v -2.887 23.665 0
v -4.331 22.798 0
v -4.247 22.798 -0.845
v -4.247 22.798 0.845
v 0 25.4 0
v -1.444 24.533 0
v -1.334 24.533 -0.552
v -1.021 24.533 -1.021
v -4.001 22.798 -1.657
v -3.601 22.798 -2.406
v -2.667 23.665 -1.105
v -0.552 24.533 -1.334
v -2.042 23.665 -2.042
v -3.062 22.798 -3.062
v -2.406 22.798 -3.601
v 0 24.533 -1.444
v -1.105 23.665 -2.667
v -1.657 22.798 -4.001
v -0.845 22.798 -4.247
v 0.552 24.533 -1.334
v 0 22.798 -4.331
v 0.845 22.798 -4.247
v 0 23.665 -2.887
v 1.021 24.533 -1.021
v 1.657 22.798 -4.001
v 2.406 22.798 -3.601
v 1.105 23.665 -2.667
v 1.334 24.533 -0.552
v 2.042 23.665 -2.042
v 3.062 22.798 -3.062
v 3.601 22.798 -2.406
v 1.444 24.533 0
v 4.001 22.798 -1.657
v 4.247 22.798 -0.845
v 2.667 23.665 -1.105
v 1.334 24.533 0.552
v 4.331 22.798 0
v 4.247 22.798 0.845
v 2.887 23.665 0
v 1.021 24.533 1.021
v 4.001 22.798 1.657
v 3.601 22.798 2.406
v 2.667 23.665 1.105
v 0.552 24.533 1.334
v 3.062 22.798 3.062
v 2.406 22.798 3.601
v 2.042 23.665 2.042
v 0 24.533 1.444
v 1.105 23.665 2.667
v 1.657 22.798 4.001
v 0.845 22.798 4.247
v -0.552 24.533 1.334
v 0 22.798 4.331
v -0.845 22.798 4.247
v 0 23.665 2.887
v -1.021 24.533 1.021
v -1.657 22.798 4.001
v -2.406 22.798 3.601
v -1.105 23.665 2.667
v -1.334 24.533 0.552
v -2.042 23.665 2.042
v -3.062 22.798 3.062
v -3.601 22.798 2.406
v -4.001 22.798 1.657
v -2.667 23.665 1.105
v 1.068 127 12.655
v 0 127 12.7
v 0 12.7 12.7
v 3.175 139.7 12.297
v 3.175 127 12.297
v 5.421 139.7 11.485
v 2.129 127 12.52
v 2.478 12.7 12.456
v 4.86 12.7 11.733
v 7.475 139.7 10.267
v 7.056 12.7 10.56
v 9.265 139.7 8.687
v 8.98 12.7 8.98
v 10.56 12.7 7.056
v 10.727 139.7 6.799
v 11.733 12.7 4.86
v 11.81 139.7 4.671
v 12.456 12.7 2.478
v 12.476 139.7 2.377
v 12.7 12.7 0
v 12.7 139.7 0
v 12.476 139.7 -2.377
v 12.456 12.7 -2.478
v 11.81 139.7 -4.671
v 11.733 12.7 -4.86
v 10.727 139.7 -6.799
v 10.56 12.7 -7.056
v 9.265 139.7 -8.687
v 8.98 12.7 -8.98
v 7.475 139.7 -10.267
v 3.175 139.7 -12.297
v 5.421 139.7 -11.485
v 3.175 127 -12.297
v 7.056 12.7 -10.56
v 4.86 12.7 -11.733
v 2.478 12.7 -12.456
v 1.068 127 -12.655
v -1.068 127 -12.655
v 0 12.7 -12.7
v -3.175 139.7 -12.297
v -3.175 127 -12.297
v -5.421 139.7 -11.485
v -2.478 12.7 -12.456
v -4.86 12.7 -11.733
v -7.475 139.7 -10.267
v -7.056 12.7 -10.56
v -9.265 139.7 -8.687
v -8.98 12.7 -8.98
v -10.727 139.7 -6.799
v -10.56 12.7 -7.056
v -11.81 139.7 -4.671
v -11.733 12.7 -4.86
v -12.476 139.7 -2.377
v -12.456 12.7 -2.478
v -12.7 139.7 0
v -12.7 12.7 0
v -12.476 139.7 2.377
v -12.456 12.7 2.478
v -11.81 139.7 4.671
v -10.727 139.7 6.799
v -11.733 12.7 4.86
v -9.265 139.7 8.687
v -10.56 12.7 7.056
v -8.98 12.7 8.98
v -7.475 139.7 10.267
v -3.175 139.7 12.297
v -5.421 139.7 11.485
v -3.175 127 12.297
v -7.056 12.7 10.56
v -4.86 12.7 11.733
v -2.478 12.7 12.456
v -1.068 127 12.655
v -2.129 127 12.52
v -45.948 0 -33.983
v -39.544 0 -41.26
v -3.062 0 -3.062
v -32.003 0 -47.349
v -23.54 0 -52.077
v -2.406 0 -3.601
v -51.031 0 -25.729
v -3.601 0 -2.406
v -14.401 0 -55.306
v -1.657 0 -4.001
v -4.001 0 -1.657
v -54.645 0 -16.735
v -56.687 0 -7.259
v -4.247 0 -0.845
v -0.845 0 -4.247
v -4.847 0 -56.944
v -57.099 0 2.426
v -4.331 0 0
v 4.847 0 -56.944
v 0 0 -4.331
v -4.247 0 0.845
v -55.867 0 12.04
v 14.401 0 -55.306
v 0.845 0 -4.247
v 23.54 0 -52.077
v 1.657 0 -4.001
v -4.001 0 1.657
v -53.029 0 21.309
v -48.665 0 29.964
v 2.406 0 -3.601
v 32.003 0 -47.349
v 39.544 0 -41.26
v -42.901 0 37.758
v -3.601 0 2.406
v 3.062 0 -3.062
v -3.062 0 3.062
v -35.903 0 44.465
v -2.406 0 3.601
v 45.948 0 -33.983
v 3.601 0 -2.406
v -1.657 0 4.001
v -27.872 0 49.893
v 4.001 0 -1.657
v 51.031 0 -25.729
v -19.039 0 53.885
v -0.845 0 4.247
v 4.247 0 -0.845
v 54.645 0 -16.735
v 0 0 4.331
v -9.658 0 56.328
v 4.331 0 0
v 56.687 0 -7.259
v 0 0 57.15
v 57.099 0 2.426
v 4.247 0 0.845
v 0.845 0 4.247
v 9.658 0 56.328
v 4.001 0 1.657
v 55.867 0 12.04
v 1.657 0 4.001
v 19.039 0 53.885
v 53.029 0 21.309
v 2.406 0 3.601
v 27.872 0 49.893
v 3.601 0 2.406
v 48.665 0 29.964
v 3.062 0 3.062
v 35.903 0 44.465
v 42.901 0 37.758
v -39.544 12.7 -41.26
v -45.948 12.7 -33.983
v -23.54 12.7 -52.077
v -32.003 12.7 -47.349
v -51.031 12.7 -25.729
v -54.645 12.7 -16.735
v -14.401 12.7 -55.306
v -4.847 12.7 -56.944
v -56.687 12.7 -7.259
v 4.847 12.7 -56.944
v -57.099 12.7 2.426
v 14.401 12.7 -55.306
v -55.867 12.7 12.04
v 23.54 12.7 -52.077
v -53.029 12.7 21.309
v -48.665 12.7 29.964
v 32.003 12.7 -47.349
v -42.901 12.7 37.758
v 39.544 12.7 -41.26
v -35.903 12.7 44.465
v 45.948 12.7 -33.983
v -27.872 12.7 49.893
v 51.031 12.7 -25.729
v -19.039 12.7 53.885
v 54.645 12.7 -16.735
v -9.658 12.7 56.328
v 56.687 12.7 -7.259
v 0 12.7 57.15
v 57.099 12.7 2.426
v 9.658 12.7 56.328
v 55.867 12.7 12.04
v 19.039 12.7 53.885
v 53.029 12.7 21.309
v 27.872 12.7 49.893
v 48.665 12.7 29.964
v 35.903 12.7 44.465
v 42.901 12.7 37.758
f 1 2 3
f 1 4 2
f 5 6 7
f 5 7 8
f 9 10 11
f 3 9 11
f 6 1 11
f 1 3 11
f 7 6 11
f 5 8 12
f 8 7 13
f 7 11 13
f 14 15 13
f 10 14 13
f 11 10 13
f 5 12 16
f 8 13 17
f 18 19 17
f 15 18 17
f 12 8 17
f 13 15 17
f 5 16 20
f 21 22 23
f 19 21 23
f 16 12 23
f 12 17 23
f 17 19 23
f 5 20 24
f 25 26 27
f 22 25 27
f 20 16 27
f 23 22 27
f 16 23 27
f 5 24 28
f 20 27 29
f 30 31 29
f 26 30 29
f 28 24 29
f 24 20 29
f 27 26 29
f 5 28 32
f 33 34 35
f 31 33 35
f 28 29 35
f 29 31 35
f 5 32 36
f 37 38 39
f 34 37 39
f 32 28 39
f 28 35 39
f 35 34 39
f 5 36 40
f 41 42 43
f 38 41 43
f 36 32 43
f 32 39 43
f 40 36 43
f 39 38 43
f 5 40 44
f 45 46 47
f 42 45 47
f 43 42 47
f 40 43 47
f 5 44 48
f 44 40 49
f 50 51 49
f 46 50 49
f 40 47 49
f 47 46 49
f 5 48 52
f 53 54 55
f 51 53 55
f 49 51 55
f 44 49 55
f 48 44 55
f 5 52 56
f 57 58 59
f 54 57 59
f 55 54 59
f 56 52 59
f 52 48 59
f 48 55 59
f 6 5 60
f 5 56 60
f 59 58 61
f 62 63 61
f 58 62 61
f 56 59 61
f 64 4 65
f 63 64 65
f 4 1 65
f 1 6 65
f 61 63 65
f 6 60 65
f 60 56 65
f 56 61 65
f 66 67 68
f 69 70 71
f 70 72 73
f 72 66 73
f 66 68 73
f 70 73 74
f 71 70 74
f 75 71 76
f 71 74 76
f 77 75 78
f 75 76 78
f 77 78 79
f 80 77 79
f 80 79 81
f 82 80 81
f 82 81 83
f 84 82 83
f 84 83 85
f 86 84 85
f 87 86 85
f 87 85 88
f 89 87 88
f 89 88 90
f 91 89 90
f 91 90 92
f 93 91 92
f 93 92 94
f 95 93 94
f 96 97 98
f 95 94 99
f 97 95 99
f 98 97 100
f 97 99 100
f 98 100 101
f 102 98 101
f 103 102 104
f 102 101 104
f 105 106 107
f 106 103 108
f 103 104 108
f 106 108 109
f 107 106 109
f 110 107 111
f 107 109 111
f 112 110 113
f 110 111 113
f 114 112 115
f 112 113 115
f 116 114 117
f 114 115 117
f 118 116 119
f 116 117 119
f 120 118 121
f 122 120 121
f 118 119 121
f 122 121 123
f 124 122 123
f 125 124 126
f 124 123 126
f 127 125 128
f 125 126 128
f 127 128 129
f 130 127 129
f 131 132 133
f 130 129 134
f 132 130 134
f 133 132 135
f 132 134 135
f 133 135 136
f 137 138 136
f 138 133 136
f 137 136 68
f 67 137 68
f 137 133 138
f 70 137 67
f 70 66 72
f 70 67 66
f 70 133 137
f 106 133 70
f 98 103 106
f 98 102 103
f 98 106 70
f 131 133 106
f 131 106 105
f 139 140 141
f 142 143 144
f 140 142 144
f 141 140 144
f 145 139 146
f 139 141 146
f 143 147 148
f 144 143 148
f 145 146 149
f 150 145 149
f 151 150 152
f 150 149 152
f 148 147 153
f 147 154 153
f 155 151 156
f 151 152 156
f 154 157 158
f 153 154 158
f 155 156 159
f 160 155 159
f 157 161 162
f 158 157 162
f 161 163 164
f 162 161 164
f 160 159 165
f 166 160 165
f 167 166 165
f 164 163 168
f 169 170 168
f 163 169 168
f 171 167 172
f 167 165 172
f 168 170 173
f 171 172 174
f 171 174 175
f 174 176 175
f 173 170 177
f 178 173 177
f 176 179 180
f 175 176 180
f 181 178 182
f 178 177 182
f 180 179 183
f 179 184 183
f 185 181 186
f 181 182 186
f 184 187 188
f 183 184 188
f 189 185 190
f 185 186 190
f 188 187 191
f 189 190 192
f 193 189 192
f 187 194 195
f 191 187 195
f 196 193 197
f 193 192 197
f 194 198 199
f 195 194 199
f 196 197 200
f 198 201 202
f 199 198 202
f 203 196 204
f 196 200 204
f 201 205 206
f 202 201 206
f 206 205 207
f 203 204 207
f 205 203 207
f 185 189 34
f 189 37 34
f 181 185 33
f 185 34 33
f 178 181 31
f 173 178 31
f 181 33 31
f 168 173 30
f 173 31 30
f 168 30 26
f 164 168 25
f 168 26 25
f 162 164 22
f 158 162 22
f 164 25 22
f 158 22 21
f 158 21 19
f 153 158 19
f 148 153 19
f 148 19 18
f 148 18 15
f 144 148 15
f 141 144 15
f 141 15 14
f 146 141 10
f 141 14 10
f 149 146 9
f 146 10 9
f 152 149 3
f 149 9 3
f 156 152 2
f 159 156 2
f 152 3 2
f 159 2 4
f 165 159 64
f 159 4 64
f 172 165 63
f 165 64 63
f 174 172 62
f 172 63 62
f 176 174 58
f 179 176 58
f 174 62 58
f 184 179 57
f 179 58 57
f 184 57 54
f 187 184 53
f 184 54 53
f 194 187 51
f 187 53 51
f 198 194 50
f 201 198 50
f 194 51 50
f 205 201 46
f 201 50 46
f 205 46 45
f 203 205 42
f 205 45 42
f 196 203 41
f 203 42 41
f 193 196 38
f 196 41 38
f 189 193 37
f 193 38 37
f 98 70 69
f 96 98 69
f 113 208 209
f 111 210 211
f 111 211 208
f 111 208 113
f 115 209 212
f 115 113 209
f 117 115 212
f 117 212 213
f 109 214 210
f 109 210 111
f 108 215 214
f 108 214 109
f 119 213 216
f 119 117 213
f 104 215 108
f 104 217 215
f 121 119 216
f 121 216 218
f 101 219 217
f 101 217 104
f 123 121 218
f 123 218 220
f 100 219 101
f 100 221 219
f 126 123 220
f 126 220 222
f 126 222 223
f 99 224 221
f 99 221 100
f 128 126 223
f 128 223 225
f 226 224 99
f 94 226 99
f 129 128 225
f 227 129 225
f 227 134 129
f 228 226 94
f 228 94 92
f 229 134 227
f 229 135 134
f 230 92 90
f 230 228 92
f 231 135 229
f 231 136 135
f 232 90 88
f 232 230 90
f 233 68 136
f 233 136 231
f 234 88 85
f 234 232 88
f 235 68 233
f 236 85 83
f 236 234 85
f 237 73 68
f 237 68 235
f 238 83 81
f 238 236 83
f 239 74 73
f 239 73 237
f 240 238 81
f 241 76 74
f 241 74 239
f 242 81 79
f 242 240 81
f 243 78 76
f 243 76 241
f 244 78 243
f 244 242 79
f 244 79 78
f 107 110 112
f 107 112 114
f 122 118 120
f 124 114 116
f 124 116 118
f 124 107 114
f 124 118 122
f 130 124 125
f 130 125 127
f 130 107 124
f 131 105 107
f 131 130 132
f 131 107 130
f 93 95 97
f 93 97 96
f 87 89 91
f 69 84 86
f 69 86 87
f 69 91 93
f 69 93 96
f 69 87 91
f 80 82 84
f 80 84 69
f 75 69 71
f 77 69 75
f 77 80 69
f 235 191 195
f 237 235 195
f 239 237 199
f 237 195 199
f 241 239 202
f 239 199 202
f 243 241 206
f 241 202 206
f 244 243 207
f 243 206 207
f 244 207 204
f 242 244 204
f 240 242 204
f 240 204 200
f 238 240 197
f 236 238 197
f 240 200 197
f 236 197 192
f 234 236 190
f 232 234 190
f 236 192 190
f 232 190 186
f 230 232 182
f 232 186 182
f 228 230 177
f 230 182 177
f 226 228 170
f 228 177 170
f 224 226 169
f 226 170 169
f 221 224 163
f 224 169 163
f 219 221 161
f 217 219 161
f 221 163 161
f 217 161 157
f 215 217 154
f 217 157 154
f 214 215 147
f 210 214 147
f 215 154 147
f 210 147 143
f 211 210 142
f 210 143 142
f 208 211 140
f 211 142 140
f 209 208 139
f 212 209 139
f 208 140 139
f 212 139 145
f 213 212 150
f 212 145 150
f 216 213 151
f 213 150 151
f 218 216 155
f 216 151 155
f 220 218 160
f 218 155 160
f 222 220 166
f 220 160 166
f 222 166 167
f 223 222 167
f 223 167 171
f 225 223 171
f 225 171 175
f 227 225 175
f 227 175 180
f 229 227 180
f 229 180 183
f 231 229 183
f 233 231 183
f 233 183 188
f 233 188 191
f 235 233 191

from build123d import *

# Parameters (mm, degrees)
SKETCH2_R                        = 57.15
BOSS_EXTRUDE1_DEPTH              = 12.7
SKETCH3_R                        = 12.7
BOSS_EXTRUDE2_DEPTH              = 127
CUT_EXTRUDE1_DEPTH               = 162.394965845
CUT_EXTRUDE1_DEPTH_BACK          = 162.394965845
SKETCH4_W                        = 6.35
SKETCH4_H                        = 12.7
F_5_8_0_341_DIAMETER_HOLE1_D     = 8.6614
F_5_8_0_341_DIAMETER_HOLE1_DEPTH = 22.797852917
F_5_8_0_341_DIAMETER_HOLE1_TIP   = 2.602147083


with BuildPart() as part:
    # Sketch2 → Boss-Extrude1 (new body)
    with BuildSketch(Plane(origin=(0, 0, 0), x_dir=(1, 0, 0), z_dir=(0, 1, 0))):
        with Locations(Location((0, 0, 0), (0, 0, 270))):
            Circle(SKETCH2_R)
    extrude(amount=BOSS_EXTRUDE1_DEPTH)

    # Sketch3 → Boss-Extrude2 (add)
    with BuildSketch(Plane(origin=(0, 12.7, 0), x_dir=(1, 0, 0), z_dir=(0, 1, 0))):
        with Locations(Location((0, 0, 0), (0, 0, 270))):
            Circle(SKETCH3_R)
    extrude(amount=BOSS_EXTRUDE2_DEPTH)

    # Sketch4 → Cut-Extrude1 (cut, two sides: drawn at the far end of the back side and taken through both)
    with BuildSketch(Plane.XY.offset(-CUT_EXTRUDE1_DEPTH_BACK)):
        with Locations((0, 133.35)):
            Rectangle(SKETCH4_W, SKETCH4_H)
    extrude(amount=CUT_EXTRUDE1_DEPTH + CUT_EXTRUDE1_DEPTH_BACK, mode=Mode.SUBTRACT)

    # 5/8 (0.341) Diameter Hole1
    with Locations(Plane(origin=(0, 0, 0), x_dir=(-1, 0, 0), z_dir=(0, -1, 0))):
        with Locations((0, 0)):
            Hole(F_5_8_0_341_DIAMETER_HOLE1_D / 2, depth=F_5_8_0_341_DIAMETER_HOLE1_DEPTH)
            with Locations((0, 0, -(F_5_8_0_341_DIAMETER_HOLE1_DEPTH + F_5_8_0_341_DIAMETER_HOLE1_TIP / 2))):  # 118° drill point
                Cone(0, F_5_8_0_341_DIAMETER_HOLE1_D / 2, F_5_8_0_341_DIAMETER_HOLE1_TIP, mode=Mode.SUBTRACT)


solid = part.part
